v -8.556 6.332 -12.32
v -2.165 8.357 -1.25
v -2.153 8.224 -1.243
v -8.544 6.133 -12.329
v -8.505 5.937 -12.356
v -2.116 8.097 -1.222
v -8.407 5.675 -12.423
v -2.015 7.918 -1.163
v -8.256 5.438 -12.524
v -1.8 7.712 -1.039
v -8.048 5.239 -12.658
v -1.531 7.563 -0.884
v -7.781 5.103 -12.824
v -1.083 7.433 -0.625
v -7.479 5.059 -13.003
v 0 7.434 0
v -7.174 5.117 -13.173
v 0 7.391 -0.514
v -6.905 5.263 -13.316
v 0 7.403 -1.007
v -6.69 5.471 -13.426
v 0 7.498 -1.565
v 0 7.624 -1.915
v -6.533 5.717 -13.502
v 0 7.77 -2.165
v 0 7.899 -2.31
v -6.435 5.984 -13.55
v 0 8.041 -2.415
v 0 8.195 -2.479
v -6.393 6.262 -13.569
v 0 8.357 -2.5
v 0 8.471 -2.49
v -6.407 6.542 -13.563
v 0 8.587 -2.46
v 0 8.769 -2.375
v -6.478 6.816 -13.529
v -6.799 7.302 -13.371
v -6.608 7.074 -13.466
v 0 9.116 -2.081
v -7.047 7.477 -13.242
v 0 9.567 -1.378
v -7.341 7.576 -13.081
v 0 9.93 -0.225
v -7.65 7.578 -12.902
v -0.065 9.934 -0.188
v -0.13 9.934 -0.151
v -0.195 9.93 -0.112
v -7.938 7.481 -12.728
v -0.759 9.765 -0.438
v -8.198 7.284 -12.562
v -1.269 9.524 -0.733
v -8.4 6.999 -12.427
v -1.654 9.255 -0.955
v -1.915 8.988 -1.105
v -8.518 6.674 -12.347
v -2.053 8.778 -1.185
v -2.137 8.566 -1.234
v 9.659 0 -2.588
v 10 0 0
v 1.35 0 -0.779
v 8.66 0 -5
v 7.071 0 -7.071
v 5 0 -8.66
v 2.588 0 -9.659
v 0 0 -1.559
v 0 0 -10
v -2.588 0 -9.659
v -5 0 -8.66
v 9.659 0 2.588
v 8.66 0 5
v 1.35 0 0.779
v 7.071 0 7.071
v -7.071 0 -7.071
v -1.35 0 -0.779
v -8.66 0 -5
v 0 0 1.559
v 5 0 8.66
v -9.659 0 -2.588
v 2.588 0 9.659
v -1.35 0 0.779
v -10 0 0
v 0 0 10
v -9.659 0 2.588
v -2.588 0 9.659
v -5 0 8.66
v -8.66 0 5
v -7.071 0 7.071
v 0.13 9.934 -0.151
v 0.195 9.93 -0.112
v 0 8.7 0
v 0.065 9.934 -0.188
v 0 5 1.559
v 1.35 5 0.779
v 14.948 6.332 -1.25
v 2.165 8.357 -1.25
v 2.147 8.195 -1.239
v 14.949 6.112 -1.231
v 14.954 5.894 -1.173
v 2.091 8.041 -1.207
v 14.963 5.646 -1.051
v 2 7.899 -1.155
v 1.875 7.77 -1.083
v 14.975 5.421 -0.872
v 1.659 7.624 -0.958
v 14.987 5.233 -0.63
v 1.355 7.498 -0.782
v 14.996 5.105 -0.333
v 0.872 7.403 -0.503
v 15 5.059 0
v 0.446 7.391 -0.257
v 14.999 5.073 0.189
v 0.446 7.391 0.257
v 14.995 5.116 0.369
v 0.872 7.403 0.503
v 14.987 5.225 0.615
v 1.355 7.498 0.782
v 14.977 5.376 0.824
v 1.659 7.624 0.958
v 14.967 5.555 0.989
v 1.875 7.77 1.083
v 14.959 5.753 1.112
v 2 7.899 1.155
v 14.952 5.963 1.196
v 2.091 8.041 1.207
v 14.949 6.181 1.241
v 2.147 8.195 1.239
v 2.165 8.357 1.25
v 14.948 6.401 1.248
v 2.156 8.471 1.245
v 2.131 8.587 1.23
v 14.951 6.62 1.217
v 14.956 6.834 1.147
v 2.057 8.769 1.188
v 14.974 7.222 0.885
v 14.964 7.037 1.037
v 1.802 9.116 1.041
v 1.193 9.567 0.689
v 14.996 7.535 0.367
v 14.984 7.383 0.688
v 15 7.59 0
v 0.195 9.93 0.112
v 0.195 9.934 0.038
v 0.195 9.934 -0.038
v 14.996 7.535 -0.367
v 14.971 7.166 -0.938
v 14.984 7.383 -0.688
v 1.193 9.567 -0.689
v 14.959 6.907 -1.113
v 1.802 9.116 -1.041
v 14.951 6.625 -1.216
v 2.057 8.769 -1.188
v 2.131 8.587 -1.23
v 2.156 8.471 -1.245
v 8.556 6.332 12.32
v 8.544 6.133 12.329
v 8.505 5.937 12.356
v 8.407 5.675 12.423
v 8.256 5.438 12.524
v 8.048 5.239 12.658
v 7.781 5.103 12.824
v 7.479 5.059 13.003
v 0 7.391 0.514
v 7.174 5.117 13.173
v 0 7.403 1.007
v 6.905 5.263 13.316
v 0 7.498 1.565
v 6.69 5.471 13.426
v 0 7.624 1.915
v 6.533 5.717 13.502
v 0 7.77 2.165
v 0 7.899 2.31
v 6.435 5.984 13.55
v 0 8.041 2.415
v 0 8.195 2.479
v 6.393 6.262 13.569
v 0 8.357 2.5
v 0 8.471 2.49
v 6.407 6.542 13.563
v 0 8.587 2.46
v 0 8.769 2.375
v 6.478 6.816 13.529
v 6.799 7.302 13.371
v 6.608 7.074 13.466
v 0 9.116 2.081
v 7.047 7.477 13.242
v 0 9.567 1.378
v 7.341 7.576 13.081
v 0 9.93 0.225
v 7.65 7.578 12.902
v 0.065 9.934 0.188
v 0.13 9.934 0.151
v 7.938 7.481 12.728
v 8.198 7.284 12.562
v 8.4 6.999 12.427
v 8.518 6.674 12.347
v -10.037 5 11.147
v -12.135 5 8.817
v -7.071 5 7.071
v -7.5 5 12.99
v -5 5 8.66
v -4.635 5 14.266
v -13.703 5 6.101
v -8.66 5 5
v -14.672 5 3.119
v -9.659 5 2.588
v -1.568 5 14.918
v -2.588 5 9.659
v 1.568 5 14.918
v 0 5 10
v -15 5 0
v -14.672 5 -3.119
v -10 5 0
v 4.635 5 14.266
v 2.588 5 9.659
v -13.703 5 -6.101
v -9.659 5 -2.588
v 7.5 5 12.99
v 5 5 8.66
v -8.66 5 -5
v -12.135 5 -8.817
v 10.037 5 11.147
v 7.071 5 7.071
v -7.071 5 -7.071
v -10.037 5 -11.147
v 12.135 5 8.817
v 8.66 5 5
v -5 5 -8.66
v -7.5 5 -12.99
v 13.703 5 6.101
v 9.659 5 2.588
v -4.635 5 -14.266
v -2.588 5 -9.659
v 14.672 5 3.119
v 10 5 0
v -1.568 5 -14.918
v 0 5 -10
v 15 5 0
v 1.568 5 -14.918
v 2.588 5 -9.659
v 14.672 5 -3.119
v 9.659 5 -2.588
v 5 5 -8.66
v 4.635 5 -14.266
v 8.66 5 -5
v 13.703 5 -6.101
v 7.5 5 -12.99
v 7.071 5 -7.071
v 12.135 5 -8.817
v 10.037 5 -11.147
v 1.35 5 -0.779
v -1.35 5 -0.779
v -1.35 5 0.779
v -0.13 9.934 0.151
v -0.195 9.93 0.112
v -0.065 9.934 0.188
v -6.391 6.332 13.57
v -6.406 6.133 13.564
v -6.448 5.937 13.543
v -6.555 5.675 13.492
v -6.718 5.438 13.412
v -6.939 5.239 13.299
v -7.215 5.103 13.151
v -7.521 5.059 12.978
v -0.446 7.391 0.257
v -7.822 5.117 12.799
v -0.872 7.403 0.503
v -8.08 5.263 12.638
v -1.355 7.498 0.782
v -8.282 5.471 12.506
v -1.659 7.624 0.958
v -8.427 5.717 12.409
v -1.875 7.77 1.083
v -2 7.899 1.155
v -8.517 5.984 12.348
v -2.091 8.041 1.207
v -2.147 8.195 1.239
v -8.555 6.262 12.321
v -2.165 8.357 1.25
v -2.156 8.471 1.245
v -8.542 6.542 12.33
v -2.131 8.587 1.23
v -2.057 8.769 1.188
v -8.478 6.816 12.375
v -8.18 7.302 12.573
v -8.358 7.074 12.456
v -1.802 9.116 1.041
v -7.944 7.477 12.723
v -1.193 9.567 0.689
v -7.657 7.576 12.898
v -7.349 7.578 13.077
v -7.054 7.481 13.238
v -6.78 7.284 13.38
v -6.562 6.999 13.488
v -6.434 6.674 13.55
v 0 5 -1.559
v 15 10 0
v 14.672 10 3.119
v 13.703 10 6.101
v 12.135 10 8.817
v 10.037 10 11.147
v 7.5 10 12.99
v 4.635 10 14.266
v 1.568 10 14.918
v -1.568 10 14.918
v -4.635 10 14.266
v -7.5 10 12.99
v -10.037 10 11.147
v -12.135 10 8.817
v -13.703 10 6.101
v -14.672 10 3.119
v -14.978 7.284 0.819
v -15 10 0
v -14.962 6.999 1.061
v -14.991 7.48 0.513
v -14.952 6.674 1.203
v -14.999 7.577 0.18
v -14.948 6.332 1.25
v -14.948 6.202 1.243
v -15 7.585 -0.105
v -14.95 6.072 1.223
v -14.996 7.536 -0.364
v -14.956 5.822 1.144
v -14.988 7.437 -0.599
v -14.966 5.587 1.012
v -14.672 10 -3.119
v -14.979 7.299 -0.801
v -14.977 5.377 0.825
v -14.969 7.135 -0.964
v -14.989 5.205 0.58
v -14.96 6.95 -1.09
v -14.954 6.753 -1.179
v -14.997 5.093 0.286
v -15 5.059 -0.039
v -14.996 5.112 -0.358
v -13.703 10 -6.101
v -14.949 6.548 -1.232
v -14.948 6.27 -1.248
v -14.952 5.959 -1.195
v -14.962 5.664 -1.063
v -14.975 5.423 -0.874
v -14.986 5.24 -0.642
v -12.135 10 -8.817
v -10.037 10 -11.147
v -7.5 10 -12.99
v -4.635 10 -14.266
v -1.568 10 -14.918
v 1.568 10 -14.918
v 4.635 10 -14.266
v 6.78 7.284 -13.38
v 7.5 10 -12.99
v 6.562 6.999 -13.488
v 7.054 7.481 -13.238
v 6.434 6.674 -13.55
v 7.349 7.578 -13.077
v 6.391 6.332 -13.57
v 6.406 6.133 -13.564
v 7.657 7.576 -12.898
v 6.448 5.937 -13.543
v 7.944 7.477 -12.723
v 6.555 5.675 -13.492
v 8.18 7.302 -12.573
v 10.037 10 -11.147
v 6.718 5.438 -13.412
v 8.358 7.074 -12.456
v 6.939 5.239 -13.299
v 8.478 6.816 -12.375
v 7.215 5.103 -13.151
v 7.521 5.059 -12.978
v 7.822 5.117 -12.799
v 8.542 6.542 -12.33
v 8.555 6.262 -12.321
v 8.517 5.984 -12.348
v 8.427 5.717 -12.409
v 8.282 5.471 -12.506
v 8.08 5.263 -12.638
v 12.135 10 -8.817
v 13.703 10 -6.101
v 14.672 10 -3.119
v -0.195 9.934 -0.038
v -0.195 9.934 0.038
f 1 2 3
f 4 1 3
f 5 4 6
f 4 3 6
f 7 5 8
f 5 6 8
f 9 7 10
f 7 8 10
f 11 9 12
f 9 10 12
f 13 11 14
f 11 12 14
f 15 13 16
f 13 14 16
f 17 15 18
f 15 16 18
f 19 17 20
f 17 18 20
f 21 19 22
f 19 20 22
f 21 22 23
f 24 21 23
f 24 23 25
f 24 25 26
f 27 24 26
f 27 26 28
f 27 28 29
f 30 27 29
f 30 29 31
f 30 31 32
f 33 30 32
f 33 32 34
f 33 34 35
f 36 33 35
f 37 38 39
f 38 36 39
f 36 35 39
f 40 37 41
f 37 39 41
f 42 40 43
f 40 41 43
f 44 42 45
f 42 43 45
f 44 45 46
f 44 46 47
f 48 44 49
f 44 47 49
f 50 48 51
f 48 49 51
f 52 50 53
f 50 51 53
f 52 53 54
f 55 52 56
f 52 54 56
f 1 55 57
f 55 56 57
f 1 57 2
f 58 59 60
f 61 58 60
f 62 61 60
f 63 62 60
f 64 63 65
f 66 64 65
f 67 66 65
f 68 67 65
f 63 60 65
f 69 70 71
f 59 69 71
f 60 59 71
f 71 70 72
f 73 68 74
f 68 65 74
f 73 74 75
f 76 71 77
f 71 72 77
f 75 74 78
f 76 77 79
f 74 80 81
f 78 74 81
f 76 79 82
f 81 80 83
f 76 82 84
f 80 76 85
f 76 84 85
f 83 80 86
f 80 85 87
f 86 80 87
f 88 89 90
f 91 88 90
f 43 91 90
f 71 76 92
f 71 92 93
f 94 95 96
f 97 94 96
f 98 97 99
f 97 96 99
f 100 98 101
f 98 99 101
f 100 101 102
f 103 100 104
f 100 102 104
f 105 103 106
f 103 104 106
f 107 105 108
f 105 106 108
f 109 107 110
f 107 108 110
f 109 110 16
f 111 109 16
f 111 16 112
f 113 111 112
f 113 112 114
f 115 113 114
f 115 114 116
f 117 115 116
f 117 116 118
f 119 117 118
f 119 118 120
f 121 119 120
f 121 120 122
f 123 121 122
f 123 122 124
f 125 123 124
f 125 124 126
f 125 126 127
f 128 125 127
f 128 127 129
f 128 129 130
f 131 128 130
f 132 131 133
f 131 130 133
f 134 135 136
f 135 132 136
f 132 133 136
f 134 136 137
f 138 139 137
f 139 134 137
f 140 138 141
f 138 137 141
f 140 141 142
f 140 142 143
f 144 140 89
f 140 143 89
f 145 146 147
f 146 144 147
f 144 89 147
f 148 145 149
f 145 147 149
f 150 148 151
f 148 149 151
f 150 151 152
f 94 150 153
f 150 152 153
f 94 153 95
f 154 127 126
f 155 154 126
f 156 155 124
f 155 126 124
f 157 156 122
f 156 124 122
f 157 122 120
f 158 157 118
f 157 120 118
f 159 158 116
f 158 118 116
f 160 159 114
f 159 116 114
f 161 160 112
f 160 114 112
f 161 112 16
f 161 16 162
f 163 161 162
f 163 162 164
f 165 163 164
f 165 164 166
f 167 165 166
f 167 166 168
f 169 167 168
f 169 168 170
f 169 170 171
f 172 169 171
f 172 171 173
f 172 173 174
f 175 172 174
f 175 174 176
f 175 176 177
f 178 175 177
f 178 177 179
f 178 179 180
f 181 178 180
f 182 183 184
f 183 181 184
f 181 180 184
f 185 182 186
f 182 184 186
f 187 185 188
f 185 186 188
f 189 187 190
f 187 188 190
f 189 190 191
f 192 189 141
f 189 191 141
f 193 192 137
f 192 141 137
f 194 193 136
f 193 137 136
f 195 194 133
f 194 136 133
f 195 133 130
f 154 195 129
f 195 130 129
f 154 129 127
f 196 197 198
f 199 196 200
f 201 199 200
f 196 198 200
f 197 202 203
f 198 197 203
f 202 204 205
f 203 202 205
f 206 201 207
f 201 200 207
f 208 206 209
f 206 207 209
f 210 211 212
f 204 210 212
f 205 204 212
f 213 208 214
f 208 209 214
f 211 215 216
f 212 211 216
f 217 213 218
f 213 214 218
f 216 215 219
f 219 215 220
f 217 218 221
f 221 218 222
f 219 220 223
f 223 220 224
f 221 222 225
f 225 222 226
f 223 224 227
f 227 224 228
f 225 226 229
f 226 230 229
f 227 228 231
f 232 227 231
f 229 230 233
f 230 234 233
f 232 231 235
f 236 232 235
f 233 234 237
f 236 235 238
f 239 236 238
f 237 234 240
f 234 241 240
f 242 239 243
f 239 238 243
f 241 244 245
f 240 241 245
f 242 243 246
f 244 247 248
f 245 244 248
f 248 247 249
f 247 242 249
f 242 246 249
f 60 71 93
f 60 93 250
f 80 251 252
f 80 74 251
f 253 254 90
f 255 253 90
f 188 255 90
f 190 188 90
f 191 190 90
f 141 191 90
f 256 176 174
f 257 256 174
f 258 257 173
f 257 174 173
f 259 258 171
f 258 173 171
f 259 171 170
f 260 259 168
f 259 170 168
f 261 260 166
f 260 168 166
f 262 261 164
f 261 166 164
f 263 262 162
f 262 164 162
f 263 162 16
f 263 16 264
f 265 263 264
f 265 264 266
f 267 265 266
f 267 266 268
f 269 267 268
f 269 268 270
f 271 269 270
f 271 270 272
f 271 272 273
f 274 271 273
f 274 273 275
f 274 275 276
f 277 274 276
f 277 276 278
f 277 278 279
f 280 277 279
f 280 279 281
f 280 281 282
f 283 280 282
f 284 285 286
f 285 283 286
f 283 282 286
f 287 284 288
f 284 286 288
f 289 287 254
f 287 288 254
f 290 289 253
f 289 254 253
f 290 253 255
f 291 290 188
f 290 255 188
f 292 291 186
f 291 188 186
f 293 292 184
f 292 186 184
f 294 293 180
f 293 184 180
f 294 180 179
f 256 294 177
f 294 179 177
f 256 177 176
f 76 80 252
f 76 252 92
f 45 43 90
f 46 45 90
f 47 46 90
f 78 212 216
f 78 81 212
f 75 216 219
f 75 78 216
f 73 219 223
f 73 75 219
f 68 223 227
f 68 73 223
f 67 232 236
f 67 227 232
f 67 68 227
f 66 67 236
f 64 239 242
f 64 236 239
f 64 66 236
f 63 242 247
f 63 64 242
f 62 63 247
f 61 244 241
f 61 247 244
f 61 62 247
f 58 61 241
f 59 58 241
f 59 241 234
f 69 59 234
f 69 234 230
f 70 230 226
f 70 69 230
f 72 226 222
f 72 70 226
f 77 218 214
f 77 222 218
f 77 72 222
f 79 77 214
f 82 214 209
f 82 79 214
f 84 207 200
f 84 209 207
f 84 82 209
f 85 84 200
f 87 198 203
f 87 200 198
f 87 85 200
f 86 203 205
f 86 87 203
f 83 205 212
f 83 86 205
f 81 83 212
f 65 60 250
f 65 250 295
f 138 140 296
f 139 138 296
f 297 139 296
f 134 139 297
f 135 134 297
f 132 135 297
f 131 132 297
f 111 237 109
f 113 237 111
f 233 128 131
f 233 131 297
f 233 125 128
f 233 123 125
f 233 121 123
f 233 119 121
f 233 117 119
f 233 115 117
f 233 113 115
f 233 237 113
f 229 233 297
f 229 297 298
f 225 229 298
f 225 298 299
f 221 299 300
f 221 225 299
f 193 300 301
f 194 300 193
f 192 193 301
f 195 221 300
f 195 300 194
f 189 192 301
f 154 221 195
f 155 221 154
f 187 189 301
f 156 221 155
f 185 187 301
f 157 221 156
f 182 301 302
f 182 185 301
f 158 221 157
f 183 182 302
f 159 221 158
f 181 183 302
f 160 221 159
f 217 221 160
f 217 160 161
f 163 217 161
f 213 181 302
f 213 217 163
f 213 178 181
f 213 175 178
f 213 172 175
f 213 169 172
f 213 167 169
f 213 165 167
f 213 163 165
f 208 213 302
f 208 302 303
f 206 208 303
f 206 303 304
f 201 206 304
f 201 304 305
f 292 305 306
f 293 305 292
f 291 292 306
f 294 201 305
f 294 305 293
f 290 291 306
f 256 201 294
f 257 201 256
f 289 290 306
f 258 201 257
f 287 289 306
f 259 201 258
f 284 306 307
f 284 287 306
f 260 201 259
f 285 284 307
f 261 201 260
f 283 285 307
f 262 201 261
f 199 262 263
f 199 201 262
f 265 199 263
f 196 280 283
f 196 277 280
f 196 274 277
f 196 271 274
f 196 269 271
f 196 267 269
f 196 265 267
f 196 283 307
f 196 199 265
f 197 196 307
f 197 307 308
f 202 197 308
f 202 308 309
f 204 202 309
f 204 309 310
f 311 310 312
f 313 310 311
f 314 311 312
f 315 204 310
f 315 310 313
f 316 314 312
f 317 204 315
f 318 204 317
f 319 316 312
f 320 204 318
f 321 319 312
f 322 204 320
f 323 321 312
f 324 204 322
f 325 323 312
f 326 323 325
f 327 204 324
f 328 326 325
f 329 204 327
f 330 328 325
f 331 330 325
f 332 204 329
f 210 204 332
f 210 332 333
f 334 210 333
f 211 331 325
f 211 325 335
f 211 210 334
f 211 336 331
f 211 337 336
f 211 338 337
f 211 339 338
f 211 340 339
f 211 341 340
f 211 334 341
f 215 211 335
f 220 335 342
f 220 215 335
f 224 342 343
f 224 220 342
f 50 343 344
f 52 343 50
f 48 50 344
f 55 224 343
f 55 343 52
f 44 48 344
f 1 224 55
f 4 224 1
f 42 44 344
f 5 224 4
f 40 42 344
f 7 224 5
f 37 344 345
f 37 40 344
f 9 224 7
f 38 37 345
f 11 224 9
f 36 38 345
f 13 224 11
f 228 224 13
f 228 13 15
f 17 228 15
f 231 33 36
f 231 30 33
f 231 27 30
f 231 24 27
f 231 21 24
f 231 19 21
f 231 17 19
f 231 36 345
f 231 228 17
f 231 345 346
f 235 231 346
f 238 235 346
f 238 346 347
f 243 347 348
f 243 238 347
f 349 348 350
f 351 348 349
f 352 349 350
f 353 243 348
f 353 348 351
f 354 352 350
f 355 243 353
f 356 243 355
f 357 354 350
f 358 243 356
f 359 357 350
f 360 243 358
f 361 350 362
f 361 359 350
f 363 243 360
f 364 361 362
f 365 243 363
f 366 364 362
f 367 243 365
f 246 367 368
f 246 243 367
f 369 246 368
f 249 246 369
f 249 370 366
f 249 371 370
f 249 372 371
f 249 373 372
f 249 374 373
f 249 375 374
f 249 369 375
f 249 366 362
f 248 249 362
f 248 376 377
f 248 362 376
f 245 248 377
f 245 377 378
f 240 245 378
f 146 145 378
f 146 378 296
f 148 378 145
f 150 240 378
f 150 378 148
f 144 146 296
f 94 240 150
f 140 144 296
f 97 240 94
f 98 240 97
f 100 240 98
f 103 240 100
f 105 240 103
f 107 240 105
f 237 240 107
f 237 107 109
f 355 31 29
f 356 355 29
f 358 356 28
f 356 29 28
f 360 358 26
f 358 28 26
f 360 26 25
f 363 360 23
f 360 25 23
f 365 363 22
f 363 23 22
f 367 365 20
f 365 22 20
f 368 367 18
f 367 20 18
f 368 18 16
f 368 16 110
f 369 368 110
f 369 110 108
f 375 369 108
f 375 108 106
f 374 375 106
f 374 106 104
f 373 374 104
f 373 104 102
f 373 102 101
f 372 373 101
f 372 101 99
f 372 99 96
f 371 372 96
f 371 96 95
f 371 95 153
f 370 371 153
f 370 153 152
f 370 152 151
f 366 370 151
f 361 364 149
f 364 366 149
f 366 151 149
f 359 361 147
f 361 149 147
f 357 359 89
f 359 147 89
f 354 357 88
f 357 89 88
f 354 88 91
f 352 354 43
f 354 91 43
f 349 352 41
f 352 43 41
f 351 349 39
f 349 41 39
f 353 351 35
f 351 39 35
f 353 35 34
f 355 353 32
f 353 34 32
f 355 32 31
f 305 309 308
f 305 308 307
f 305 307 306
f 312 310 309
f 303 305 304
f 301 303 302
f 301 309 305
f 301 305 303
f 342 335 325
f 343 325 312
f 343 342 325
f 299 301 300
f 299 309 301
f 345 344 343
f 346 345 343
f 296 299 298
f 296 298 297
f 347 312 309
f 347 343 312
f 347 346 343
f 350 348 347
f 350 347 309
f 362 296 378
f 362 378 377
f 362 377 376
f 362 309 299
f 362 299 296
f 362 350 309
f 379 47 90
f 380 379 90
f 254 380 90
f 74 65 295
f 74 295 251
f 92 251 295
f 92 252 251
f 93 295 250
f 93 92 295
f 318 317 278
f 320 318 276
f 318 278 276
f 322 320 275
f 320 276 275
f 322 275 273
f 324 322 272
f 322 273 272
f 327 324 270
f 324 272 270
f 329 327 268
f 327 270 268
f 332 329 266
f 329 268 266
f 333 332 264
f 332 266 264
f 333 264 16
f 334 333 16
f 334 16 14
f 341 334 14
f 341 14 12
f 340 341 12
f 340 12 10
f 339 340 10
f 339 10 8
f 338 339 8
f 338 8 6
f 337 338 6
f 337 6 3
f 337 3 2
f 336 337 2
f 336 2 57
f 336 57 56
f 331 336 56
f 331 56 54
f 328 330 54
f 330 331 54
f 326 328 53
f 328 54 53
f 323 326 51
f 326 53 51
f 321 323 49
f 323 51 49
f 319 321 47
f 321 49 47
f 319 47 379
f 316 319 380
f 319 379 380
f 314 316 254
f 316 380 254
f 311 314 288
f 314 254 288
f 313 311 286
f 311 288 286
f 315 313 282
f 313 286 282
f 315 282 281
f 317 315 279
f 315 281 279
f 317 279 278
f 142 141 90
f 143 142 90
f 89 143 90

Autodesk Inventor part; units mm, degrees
ref_plane "YZ Plane" through (0, 0, 0) normal (1, 0, 0) x (0, 1, 0)
ref_plane "XZ Plane" through (0, 0, 0) normal (0, 1, 0) x (-1, 0, 0)
sketch "スケッチ1" plane through (0, 0, 0) normal (0, 1, 0) x (-1, 0, 0)
  circle A0 centre (0, 0) radius 10
  dimension "d0" = 20
extrude "押し出し1" add sketch "スケッチ1" along normal blind 5
sketch "スケッチ2" plane through (0, 5, 0) normal (0, 1, 0) x (1, 0, 0)
  circle A0 centre (0, 0) radius 15
  dimension "dia_rod_base" = 30
extrude "押し出し2" add sketch "スケッチ2" along normal blind 5
sketch "スケッチ5" plane through (0, 0, 0) normal (0, -1, 0) x (1, 0, 0)
  line L0 (0, 1.5588) -> (1.35, 0.7794)
  line L1 (1.35, 0.7794) -> (1.35, -0.7794)
  line L2 (1.35, -0.7794) -> (0, -1.5588)
  line L3 (0, -1.5588) -> (-1.35, -0.7794)
  line L4 (-1.35, -0.7794) -> (-1.35, 0.7794)
  line L5 (-1.35, 0.7794) -> (0, 1.5588)
  point P0 (0, 0)
  point P1 (0, 0)
  dimension "d14" = 2.7
extrude "押し出し3" cut sketch "スケッチ5" against normal blind 5
ref_plane "作業平面1" through (0, 0, 3) normal (0, 0, 1) x (1, 0, 0)
sketch "スケッチ10" plane through (0, 0, 3) normal (0, 0, 1) x (1, 0, 0)
  line L0 (15, 10) -> (-15, 10) projected
  line L1 (15, 10) -> (-15, 10) projected
  line L2 (15, 5) -> (-15.1085, 12.4268)
  line L3 (15, 5) -> (15, 10) projected
  line L4 (15, 5) -> (-15.1085, 12.4268)
  point P0 (0, 0)
  point P1 (0, 8.7)
  point P2 (0, 10)
  point P3 (-0.0543, 8.7134)
  dimension "d30" = 15
  dimension "d37" = 1.3
ref_plane "作業平面2" through (0, 8.7, 3) normal (-0.9877, -0.1564, 0) x (0, 0, 1)
sketch "スケッチ11" plane through (0, 8.7, 3) normal (-0.9877, -0.1564, 0) x (0, 0, 1)
  circle A0 centre (-3, 0) radius 1.25
  line L0 (-18, -3.6544) -> (-18, 1.284) projected
  line L1 (12, -3.6544) -> (12, 1.284) projected
  line L2 (-24, 0) -> (18, 0) projected
  point P0 (-3, -8.5929)
  dimension "d32" = 2.5
  dimension "d33" = 15
extrude "押し出し6" cut sketch "スケッチ11" along normal through all
pattern_circular "円形状パターン2" count 6 over 360 about axis through (0, 5, 0) along (0, 1, 0) of "押し出し6"
equation "\"d30\" = 0.5 * dia_rod_base"
properties part number "exp_tire_6rod_lower_rev0"
